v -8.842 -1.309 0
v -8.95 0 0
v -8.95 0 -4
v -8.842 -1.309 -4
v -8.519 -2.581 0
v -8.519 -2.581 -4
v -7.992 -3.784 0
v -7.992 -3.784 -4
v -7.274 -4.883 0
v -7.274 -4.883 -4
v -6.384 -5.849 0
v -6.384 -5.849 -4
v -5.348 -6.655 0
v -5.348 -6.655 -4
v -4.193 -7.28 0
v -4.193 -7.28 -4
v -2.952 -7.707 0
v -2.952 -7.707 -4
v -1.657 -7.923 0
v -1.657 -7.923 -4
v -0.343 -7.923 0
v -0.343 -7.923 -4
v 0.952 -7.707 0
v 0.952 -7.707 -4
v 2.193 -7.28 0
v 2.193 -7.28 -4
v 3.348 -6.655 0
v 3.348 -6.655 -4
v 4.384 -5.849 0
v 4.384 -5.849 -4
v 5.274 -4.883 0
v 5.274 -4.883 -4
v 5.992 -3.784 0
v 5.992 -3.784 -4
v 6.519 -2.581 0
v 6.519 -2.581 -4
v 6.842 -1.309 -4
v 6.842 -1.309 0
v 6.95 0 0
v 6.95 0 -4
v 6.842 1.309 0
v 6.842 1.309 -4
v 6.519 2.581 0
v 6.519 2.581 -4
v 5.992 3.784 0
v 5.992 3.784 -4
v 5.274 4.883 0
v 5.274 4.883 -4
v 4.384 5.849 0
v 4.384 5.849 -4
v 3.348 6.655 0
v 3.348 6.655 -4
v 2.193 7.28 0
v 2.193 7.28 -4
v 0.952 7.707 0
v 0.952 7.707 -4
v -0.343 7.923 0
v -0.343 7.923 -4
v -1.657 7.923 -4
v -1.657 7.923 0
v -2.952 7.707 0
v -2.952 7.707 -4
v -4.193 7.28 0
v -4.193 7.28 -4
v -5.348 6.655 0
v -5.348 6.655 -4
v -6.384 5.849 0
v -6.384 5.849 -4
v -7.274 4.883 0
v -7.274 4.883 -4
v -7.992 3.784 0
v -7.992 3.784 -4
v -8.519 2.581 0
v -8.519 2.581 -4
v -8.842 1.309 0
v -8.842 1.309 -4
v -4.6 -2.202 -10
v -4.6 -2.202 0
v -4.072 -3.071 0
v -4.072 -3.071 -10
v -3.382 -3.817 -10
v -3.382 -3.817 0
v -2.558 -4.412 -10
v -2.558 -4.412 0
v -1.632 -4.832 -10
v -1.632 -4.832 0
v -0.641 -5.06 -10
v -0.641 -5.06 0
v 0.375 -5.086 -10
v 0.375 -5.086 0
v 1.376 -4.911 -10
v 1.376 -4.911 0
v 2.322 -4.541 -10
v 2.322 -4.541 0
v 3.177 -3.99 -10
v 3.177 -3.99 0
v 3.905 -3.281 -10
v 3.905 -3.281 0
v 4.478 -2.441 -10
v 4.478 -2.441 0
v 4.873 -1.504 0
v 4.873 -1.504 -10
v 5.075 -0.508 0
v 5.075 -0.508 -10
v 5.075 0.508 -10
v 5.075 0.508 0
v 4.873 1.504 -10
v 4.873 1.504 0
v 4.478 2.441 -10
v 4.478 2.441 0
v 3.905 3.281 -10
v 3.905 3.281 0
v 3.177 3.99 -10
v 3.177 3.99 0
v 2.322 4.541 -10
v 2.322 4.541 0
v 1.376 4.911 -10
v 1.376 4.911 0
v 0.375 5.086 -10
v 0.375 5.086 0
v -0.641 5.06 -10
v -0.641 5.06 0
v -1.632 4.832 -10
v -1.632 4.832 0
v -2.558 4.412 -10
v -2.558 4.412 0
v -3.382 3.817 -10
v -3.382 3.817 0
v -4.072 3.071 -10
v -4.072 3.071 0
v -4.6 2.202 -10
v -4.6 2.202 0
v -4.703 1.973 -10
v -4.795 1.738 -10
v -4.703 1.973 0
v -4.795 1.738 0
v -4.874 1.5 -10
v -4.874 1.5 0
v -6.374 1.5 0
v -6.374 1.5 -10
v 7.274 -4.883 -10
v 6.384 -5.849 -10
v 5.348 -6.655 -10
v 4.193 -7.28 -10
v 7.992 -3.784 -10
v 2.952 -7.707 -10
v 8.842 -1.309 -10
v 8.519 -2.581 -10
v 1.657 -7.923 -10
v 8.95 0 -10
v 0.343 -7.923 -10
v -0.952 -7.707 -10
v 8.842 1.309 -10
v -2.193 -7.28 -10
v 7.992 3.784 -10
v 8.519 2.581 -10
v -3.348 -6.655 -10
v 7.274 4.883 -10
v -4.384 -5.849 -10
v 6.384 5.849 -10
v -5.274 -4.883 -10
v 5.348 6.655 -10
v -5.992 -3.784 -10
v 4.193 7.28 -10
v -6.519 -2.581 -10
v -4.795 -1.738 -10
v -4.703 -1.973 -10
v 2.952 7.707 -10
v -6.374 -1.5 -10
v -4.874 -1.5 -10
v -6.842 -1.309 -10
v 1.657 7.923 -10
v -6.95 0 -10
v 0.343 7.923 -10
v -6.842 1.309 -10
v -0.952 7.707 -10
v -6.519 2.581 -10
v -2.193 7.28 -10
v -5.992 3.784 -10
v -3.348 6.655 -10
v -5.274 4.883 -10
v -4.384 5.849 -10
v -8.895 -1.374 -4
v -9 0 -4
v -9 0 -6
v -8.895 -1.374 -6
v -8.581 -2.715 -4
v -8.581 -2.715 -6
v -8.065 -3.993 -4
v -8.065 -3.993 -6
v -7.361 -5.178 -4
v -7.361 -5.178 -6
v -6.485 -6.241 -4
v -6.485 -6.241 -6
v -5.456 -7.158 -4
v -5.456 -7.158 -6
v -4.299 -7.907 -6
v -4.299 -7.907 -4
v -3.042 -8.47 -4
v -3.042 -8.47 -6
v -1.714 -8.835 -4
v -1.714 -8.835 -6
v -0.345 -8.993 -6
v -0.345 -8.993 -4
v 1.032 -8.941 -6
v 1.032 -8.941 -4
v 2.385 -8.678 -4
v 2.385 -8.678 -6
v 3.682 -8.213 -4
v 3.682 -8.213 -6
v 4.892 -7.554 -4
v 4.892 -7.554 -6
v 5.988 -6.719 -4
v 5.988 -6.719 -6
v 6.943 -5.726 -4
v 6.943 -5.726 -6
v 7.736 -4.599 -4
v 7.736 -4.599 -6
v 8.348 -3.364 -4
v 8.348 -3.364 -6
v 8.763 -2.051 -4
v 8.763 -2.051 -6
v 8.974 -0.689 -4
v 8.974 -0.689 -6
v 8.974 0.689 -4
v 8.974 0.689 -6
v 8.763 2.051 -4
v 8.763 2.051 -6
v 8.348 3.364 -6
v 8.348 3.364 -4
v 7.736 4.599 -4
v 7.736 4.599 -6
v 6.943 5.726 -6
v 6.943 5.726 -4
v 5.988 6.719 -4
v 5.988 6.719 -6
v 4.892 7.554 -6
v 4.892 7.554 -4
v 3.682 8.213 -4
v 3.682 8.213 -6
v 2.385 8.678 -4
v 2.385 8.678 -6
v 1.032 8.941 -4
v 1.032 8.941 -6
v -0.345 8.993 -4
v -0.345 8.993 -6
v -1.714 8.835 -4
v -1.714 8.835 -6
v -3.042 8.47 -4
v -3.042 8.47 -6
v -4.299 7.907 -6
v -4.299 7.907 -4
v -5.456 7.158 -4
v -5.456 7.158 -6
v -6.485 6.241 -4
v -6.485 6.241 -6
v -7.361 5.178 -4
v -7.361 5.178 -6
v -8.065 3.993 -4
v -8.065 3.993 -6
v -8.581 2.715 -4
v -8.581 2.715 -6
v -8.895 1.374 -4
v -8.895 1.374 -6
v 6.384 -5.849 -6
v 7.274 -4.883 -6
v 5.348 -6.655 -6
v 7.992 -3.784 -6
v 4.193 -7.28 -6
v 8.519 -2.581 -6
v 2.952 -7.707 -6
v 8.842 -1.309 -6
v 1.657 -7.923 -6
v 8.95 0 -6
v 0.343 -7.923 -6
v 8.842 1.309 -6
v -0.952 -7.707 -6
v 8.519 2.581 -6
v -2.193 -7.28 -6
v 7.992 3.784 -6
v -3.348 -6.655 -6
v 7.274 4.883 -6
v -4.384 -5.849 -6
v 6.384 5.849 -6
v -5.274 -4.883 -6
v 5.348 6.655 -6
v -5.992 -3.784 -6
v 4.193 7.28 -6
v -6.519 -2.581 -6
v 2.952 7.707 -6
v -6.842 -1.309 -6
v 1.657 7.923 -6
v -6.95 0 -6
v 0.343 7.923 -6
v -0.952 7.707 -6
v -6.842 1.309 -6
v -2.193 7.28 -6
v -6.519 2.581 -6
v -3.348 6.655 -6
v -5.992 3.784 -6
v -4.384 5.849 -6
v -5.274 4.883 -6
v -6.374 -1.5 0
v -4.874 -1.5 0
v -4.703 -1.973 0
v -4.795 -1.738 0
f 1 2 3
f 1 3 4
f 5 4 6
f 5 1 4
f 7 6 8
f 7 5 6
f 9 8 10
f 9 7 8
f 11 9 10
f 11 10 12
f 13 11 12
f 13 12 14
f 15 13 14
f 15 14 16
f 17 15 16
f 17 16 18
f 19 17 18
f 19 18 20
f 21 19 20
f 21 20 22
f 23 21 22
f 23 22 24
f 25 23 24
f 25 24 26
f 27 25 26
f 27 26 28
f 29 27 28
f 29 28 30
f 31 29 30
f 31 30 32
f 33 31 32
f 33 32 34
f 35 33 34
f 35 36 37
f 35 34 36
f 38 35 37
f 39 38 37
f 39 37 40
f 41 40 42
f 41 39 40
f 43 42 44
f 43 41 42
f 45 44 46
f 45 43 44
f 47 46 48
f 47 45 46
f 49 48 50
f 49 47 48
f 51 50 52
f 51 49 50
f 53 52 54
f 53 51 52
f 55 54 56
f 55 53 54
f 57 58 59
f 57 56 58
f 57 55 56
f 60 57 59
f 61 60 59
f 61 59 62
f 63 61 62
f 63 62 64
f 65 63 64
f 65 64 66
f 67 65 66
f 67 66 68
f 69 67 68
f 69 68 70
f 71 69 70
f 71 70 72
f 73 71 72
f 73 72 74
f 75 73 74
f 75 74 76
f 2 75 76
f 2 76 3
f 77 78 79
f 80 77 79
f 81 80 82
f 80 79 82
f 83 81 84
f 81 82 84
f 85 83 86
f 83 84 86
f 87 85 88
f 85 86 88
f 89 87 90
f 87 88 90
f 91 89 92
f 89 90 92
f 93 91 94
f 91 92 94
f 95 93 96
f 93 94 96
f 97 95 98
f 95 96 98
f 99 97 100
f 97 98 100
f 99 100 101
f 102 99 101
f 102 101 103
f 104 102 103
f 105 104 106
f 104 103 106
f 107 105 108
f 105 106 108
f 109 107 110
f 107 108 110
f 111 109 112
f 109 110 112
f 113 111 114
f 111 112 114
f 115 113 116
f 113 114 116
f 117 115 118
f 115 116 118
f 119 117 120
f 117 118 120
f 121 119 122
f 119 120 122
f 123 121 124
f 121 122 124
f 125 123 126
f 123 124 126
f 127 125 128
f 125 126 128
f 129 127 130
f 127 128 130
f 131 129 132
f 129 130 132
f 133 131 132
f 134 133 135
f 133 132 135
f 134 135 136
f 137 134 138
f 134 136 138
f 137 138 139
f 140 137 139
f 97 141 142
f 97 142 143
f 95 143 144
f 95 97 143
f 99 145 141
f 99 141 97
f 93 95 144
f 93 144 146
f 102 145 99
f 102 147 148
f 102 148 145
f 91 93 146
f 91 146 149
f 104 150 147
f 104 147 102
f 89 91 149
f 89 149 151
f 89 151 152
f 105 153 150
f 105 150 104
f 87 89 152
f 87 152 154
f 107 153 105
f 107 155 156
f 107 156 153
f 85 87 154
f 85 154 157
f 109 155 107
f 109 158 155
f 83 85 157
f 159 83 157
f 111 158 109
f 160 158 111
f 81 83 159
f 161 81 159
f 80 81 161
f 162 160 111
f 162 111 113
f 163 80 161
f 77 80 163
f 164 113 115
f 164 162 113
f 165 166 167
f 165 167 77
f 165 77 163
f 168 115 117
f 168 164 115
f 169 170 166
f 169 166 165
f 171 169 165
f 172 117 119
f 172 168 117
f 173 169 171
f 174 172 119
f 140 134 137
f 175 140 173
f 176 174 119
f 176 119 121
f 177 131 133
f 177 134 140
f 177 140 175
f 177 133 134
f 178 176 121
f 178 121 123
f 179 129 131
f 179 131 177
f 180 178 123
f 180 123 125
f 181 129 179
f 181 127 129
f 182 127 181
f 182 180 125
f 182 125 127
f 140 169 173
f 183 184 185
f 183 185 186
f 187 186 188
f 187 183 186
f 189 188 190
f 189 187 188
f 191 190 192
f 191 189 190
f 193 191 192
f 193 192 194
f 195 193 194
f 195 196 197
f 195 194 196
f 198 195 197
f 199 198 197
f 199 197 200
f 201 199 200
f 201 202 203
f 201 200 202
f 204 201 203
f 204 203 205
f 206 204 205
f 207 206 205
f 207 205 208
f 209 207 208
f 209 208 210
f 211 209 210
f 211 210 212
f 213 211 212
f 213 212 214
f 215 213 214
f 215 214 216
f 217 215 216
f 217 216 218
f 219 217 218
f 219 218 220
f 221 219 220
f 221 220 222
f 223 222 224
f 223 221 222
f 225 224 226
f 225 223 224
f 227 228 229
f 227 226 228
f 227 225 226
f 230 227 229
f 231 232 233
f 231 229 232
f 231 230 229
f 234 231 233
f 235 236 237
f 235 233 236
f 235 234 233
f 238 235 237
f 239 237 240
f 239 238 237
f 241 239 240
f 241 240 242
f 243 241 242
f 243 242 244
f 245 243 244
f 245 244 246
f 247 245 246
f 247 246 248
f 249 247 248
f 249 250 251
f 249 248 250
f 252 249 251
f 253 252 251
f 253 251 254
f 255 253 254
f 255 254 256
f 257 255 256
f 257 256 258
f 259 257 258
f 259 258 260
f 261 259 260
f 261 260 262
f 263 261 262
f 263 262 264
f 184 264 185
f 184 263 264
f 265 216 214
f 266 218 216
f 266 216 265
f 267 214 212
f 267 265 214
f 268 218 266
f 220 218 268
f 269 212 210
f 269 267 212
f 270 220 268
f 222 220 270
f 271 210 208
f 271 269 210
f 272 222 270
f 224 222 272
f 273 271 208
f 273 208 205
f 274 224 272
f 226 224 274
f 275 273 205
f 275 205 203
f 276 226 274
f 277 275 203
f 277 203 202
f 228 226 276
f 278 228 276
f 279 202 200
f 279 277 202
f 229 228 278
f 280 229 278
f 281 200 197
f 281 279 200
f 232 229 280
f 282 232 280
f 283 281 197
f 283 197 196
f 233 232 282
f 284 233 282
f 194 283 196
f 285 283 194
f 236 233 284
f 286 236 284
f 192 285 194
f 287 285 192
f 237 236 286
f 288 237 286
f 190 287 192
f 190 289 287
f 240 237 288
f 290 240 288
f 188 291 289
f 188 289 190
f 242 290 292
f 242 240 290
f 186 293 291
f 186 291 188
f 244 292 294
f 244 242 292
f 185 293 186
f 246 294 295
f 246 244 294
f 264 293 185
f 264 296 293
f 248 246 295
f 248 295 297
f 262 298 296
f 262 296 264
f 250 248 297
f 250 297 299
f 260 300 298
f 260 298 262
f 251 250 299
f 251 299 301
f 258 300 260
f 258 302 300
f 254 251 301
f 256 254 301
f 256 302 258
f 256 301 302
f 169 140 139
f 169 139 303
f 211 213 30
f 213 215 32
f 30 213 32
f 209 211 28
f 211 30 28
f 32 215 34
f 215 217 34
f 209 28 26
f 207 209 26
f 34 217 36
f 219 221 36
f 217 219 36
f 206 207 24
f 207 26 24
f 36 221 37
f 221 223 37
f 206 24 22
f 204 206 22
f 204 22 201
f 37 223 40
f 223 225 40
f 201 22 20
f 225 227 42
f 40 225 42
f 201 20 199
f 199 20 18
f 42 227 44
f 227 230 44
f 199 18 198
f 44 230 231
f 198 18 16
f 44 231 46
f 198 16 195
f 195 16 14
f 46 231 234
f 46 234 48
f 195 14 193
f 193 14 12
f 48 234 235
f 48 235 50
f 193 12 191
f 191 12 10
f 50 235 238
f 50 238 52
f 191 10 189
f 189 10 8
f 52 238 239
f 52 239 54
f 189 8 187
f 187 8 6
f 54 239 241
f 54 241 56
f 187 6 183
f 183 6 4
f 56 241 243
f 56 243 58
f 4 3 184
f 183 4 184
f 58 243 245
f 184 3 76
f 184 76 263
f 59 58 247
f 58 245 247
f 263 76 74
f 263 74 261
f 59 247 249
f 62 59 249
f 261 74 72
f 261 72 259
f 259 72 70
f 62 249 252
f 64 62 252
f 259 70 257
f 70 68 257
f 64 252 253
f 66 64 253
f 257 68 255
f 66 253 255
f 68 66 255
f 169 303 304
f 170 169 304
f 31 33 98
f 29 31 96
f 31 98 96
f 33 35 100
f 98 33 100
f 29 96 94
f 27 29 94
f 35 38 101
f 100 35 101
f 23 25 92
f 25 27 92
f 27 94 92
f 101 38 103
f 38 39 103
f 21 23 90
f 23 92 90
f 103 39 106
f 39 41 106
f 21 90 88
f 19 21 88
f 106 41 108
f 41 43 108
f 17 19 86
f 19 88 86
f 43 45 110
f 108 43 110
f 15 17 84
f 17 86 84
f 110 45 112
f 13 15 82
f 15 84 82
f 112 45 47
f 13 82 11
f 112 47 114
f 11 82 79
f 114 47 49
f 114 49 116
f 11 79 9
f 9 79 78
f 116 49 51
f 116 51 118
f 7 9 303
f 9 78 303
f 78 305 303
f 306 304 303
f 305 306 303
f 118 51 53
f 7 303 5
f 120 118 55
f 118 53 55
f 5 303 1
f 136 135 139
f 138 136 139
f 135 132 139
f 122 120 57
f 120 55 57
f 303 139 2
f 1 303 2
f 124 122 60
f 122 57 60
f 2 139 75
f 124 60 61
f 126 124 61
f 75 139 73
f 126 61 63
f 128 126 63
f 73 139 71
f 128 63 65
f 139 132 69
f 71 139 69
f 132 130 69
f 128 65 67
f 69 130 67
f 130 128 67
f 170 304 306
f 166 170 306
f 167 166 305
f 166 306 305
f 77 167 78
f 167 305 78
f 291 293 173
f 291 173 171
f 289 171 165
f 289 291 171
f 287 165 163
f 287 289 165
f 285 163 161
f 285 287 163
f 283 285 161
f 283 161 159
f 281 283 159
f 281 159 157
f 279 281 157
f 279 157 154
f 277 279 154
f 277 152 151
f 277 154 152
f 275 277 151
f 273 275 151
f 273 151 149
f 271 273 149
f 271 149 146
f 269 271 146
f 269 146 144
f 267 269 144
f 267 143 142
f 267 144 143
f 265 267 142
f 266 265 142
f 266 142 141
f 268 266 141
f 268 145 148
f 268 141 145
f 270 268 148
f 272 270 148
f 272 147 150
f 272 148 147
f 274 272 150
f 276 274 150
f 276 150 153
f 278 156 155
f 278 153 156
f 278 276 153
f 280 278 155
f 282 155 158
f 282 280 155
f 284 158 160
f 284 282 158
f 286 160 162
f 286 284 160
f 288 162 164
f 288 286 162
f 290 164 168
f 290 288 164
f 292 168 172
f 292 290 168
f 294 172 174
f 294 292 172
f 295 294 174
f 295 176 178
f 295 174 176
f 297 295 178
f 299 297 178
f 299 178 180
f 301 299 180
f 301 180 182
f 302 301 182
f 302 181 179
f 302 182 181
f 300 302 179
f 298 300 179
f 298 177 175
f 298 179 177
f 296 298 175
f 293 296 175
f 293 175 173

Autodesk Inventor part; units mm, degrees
ref_plane "YZ Plane" through (0, 0, 0) normal (1, 0, 0) x (0, 1, 0)
ref_plane "XZ Plane" through (0, 0, 0) normal (0, 1, 0) x (-1, 0, 0)
ref_plane "XY Plane" through (0, 0, 0) normal (0, 0, 1) x (1, 0, 0)
sketch "Sketch1" plane through (0, 0, 0) normal (0, 0, 1) x (1, 0, 0)
  arc A0 (-4.5, -2.1795) -> (-4.5, 2.1795) centre (0, 0) ccw construction
  line L0 (-4.5, 2.1795) -> (-4.5, -2.1795) construction
  arc A1 (-4.5, 2.1795) -> (-4.5, -2.1795) centre (0, 0) ccw construction
  arc A2 (-4.6, -2.2023) -> (-4.6, 2.2023) centre (0, 0) ccw
  line L1 (-4.6, -2.2023) -> (-4.6, 2.2023)
  circle A3 centre (0, 0) radius 8
  dimension "d0" = 10
  dimension "d1" = 4.359
  dimension "d2" = 0.1
  dimension "d3" = 16
extrude "Extrusion1" add sketch "Sketch1" along normal blind 4
sketch "Sketch2" plane through (0, 0, 0) normal (0, 0, -1) x (-1, 0, 0)
  circle A0 centre (1, 0) radius 7.95
  arc A1 (4.6, 2.2023) -> (4.6, -2.2023) centre (0, 0) ccw projected
  line L0 (4.6, -2.2023) -> (4.6, 2.2023) projected
  dimension "d6" = 15.9
  dimension "d7" = 1
extrude "Extrusion2" add sketch "Sketch2" along normal blind 4
sketch "Sketch5" plane through (0, 0, 4) normal (0, 0, 1) x (1, 0, 0)
  circle A0 centre (0, 0) radius 8 projected
extrude "Extrusion5" cut sketch "Sketch5" against normal up to surface (4 mm away)
sketch "Sketch6" plane through (-1, 0, -4) normal (0, 0, -1) x (-1, 0, 0)
  circle A0 centre (-1, 0) radius 9
  arc A1 (3.6, 2.2023) -> (3.6, -2.2023) centre (-1, 0) ccw projected
  line L0 (3.6, 2.2023) -> (3.6, -2.2023) projected
  dimension "d19" = 18
extrude "Extrusion6" add sketch "Sketch6" along normal blind 2
sketch "Sketch7" plane through (0, 0, -6) normal (0, 0, -1) x (-1, 0, 0)
  circle A0 centre (-1, 0) radius 7.95
  arc A1 (4.6, 2.2023) -> (4.6, -2.2023) centre (0, 0) ccw projected
  line L0 (4.6, 2.2023) -> (4.6, -2.2023) projected
  dimension "d22" = 15.9
  dimension "d23" = 1
extrude "Extrusion7" add sketch "Sketch7" along normal blind 4
sketch "Sketch9" plane through (-1, 0, 0) normal (0, 0, 1) x (1, 0, 0)
  arc A0 (-3.8744, -1.5) -> (-3.8744, 1.5) centre (1, 0) ccw
  arc A1 (-3.6, -2.2023) -> (-3.6, 2.2023) centre (1, 0) ccw construction
  line L0 (-3.8744, 1.5) -> (-5.3744, 1.5)
  line L1 (-5.3744, 1.5) -> (-5.3744, -1.5)
  line L2 (-5.3744, -1.5) -> (-3.8744, -1.5)
  arc A2 (-3.8744, 1.5) -> (-3.8744, -1.5) centre (1, 0) ccw construction
  point P0 (-4.6244, 1.5)
  point P1 (-4.6244, -1.5)
  point P2 (-5.3744, 0)
  dimension "d30" = 3
  dimension "d31" = 1.5
extrude "Extrusion9" cut sketch "Sketch9" against normal through all
properties part number "EccentricBearingShaft" material "Aluminum 6061"
